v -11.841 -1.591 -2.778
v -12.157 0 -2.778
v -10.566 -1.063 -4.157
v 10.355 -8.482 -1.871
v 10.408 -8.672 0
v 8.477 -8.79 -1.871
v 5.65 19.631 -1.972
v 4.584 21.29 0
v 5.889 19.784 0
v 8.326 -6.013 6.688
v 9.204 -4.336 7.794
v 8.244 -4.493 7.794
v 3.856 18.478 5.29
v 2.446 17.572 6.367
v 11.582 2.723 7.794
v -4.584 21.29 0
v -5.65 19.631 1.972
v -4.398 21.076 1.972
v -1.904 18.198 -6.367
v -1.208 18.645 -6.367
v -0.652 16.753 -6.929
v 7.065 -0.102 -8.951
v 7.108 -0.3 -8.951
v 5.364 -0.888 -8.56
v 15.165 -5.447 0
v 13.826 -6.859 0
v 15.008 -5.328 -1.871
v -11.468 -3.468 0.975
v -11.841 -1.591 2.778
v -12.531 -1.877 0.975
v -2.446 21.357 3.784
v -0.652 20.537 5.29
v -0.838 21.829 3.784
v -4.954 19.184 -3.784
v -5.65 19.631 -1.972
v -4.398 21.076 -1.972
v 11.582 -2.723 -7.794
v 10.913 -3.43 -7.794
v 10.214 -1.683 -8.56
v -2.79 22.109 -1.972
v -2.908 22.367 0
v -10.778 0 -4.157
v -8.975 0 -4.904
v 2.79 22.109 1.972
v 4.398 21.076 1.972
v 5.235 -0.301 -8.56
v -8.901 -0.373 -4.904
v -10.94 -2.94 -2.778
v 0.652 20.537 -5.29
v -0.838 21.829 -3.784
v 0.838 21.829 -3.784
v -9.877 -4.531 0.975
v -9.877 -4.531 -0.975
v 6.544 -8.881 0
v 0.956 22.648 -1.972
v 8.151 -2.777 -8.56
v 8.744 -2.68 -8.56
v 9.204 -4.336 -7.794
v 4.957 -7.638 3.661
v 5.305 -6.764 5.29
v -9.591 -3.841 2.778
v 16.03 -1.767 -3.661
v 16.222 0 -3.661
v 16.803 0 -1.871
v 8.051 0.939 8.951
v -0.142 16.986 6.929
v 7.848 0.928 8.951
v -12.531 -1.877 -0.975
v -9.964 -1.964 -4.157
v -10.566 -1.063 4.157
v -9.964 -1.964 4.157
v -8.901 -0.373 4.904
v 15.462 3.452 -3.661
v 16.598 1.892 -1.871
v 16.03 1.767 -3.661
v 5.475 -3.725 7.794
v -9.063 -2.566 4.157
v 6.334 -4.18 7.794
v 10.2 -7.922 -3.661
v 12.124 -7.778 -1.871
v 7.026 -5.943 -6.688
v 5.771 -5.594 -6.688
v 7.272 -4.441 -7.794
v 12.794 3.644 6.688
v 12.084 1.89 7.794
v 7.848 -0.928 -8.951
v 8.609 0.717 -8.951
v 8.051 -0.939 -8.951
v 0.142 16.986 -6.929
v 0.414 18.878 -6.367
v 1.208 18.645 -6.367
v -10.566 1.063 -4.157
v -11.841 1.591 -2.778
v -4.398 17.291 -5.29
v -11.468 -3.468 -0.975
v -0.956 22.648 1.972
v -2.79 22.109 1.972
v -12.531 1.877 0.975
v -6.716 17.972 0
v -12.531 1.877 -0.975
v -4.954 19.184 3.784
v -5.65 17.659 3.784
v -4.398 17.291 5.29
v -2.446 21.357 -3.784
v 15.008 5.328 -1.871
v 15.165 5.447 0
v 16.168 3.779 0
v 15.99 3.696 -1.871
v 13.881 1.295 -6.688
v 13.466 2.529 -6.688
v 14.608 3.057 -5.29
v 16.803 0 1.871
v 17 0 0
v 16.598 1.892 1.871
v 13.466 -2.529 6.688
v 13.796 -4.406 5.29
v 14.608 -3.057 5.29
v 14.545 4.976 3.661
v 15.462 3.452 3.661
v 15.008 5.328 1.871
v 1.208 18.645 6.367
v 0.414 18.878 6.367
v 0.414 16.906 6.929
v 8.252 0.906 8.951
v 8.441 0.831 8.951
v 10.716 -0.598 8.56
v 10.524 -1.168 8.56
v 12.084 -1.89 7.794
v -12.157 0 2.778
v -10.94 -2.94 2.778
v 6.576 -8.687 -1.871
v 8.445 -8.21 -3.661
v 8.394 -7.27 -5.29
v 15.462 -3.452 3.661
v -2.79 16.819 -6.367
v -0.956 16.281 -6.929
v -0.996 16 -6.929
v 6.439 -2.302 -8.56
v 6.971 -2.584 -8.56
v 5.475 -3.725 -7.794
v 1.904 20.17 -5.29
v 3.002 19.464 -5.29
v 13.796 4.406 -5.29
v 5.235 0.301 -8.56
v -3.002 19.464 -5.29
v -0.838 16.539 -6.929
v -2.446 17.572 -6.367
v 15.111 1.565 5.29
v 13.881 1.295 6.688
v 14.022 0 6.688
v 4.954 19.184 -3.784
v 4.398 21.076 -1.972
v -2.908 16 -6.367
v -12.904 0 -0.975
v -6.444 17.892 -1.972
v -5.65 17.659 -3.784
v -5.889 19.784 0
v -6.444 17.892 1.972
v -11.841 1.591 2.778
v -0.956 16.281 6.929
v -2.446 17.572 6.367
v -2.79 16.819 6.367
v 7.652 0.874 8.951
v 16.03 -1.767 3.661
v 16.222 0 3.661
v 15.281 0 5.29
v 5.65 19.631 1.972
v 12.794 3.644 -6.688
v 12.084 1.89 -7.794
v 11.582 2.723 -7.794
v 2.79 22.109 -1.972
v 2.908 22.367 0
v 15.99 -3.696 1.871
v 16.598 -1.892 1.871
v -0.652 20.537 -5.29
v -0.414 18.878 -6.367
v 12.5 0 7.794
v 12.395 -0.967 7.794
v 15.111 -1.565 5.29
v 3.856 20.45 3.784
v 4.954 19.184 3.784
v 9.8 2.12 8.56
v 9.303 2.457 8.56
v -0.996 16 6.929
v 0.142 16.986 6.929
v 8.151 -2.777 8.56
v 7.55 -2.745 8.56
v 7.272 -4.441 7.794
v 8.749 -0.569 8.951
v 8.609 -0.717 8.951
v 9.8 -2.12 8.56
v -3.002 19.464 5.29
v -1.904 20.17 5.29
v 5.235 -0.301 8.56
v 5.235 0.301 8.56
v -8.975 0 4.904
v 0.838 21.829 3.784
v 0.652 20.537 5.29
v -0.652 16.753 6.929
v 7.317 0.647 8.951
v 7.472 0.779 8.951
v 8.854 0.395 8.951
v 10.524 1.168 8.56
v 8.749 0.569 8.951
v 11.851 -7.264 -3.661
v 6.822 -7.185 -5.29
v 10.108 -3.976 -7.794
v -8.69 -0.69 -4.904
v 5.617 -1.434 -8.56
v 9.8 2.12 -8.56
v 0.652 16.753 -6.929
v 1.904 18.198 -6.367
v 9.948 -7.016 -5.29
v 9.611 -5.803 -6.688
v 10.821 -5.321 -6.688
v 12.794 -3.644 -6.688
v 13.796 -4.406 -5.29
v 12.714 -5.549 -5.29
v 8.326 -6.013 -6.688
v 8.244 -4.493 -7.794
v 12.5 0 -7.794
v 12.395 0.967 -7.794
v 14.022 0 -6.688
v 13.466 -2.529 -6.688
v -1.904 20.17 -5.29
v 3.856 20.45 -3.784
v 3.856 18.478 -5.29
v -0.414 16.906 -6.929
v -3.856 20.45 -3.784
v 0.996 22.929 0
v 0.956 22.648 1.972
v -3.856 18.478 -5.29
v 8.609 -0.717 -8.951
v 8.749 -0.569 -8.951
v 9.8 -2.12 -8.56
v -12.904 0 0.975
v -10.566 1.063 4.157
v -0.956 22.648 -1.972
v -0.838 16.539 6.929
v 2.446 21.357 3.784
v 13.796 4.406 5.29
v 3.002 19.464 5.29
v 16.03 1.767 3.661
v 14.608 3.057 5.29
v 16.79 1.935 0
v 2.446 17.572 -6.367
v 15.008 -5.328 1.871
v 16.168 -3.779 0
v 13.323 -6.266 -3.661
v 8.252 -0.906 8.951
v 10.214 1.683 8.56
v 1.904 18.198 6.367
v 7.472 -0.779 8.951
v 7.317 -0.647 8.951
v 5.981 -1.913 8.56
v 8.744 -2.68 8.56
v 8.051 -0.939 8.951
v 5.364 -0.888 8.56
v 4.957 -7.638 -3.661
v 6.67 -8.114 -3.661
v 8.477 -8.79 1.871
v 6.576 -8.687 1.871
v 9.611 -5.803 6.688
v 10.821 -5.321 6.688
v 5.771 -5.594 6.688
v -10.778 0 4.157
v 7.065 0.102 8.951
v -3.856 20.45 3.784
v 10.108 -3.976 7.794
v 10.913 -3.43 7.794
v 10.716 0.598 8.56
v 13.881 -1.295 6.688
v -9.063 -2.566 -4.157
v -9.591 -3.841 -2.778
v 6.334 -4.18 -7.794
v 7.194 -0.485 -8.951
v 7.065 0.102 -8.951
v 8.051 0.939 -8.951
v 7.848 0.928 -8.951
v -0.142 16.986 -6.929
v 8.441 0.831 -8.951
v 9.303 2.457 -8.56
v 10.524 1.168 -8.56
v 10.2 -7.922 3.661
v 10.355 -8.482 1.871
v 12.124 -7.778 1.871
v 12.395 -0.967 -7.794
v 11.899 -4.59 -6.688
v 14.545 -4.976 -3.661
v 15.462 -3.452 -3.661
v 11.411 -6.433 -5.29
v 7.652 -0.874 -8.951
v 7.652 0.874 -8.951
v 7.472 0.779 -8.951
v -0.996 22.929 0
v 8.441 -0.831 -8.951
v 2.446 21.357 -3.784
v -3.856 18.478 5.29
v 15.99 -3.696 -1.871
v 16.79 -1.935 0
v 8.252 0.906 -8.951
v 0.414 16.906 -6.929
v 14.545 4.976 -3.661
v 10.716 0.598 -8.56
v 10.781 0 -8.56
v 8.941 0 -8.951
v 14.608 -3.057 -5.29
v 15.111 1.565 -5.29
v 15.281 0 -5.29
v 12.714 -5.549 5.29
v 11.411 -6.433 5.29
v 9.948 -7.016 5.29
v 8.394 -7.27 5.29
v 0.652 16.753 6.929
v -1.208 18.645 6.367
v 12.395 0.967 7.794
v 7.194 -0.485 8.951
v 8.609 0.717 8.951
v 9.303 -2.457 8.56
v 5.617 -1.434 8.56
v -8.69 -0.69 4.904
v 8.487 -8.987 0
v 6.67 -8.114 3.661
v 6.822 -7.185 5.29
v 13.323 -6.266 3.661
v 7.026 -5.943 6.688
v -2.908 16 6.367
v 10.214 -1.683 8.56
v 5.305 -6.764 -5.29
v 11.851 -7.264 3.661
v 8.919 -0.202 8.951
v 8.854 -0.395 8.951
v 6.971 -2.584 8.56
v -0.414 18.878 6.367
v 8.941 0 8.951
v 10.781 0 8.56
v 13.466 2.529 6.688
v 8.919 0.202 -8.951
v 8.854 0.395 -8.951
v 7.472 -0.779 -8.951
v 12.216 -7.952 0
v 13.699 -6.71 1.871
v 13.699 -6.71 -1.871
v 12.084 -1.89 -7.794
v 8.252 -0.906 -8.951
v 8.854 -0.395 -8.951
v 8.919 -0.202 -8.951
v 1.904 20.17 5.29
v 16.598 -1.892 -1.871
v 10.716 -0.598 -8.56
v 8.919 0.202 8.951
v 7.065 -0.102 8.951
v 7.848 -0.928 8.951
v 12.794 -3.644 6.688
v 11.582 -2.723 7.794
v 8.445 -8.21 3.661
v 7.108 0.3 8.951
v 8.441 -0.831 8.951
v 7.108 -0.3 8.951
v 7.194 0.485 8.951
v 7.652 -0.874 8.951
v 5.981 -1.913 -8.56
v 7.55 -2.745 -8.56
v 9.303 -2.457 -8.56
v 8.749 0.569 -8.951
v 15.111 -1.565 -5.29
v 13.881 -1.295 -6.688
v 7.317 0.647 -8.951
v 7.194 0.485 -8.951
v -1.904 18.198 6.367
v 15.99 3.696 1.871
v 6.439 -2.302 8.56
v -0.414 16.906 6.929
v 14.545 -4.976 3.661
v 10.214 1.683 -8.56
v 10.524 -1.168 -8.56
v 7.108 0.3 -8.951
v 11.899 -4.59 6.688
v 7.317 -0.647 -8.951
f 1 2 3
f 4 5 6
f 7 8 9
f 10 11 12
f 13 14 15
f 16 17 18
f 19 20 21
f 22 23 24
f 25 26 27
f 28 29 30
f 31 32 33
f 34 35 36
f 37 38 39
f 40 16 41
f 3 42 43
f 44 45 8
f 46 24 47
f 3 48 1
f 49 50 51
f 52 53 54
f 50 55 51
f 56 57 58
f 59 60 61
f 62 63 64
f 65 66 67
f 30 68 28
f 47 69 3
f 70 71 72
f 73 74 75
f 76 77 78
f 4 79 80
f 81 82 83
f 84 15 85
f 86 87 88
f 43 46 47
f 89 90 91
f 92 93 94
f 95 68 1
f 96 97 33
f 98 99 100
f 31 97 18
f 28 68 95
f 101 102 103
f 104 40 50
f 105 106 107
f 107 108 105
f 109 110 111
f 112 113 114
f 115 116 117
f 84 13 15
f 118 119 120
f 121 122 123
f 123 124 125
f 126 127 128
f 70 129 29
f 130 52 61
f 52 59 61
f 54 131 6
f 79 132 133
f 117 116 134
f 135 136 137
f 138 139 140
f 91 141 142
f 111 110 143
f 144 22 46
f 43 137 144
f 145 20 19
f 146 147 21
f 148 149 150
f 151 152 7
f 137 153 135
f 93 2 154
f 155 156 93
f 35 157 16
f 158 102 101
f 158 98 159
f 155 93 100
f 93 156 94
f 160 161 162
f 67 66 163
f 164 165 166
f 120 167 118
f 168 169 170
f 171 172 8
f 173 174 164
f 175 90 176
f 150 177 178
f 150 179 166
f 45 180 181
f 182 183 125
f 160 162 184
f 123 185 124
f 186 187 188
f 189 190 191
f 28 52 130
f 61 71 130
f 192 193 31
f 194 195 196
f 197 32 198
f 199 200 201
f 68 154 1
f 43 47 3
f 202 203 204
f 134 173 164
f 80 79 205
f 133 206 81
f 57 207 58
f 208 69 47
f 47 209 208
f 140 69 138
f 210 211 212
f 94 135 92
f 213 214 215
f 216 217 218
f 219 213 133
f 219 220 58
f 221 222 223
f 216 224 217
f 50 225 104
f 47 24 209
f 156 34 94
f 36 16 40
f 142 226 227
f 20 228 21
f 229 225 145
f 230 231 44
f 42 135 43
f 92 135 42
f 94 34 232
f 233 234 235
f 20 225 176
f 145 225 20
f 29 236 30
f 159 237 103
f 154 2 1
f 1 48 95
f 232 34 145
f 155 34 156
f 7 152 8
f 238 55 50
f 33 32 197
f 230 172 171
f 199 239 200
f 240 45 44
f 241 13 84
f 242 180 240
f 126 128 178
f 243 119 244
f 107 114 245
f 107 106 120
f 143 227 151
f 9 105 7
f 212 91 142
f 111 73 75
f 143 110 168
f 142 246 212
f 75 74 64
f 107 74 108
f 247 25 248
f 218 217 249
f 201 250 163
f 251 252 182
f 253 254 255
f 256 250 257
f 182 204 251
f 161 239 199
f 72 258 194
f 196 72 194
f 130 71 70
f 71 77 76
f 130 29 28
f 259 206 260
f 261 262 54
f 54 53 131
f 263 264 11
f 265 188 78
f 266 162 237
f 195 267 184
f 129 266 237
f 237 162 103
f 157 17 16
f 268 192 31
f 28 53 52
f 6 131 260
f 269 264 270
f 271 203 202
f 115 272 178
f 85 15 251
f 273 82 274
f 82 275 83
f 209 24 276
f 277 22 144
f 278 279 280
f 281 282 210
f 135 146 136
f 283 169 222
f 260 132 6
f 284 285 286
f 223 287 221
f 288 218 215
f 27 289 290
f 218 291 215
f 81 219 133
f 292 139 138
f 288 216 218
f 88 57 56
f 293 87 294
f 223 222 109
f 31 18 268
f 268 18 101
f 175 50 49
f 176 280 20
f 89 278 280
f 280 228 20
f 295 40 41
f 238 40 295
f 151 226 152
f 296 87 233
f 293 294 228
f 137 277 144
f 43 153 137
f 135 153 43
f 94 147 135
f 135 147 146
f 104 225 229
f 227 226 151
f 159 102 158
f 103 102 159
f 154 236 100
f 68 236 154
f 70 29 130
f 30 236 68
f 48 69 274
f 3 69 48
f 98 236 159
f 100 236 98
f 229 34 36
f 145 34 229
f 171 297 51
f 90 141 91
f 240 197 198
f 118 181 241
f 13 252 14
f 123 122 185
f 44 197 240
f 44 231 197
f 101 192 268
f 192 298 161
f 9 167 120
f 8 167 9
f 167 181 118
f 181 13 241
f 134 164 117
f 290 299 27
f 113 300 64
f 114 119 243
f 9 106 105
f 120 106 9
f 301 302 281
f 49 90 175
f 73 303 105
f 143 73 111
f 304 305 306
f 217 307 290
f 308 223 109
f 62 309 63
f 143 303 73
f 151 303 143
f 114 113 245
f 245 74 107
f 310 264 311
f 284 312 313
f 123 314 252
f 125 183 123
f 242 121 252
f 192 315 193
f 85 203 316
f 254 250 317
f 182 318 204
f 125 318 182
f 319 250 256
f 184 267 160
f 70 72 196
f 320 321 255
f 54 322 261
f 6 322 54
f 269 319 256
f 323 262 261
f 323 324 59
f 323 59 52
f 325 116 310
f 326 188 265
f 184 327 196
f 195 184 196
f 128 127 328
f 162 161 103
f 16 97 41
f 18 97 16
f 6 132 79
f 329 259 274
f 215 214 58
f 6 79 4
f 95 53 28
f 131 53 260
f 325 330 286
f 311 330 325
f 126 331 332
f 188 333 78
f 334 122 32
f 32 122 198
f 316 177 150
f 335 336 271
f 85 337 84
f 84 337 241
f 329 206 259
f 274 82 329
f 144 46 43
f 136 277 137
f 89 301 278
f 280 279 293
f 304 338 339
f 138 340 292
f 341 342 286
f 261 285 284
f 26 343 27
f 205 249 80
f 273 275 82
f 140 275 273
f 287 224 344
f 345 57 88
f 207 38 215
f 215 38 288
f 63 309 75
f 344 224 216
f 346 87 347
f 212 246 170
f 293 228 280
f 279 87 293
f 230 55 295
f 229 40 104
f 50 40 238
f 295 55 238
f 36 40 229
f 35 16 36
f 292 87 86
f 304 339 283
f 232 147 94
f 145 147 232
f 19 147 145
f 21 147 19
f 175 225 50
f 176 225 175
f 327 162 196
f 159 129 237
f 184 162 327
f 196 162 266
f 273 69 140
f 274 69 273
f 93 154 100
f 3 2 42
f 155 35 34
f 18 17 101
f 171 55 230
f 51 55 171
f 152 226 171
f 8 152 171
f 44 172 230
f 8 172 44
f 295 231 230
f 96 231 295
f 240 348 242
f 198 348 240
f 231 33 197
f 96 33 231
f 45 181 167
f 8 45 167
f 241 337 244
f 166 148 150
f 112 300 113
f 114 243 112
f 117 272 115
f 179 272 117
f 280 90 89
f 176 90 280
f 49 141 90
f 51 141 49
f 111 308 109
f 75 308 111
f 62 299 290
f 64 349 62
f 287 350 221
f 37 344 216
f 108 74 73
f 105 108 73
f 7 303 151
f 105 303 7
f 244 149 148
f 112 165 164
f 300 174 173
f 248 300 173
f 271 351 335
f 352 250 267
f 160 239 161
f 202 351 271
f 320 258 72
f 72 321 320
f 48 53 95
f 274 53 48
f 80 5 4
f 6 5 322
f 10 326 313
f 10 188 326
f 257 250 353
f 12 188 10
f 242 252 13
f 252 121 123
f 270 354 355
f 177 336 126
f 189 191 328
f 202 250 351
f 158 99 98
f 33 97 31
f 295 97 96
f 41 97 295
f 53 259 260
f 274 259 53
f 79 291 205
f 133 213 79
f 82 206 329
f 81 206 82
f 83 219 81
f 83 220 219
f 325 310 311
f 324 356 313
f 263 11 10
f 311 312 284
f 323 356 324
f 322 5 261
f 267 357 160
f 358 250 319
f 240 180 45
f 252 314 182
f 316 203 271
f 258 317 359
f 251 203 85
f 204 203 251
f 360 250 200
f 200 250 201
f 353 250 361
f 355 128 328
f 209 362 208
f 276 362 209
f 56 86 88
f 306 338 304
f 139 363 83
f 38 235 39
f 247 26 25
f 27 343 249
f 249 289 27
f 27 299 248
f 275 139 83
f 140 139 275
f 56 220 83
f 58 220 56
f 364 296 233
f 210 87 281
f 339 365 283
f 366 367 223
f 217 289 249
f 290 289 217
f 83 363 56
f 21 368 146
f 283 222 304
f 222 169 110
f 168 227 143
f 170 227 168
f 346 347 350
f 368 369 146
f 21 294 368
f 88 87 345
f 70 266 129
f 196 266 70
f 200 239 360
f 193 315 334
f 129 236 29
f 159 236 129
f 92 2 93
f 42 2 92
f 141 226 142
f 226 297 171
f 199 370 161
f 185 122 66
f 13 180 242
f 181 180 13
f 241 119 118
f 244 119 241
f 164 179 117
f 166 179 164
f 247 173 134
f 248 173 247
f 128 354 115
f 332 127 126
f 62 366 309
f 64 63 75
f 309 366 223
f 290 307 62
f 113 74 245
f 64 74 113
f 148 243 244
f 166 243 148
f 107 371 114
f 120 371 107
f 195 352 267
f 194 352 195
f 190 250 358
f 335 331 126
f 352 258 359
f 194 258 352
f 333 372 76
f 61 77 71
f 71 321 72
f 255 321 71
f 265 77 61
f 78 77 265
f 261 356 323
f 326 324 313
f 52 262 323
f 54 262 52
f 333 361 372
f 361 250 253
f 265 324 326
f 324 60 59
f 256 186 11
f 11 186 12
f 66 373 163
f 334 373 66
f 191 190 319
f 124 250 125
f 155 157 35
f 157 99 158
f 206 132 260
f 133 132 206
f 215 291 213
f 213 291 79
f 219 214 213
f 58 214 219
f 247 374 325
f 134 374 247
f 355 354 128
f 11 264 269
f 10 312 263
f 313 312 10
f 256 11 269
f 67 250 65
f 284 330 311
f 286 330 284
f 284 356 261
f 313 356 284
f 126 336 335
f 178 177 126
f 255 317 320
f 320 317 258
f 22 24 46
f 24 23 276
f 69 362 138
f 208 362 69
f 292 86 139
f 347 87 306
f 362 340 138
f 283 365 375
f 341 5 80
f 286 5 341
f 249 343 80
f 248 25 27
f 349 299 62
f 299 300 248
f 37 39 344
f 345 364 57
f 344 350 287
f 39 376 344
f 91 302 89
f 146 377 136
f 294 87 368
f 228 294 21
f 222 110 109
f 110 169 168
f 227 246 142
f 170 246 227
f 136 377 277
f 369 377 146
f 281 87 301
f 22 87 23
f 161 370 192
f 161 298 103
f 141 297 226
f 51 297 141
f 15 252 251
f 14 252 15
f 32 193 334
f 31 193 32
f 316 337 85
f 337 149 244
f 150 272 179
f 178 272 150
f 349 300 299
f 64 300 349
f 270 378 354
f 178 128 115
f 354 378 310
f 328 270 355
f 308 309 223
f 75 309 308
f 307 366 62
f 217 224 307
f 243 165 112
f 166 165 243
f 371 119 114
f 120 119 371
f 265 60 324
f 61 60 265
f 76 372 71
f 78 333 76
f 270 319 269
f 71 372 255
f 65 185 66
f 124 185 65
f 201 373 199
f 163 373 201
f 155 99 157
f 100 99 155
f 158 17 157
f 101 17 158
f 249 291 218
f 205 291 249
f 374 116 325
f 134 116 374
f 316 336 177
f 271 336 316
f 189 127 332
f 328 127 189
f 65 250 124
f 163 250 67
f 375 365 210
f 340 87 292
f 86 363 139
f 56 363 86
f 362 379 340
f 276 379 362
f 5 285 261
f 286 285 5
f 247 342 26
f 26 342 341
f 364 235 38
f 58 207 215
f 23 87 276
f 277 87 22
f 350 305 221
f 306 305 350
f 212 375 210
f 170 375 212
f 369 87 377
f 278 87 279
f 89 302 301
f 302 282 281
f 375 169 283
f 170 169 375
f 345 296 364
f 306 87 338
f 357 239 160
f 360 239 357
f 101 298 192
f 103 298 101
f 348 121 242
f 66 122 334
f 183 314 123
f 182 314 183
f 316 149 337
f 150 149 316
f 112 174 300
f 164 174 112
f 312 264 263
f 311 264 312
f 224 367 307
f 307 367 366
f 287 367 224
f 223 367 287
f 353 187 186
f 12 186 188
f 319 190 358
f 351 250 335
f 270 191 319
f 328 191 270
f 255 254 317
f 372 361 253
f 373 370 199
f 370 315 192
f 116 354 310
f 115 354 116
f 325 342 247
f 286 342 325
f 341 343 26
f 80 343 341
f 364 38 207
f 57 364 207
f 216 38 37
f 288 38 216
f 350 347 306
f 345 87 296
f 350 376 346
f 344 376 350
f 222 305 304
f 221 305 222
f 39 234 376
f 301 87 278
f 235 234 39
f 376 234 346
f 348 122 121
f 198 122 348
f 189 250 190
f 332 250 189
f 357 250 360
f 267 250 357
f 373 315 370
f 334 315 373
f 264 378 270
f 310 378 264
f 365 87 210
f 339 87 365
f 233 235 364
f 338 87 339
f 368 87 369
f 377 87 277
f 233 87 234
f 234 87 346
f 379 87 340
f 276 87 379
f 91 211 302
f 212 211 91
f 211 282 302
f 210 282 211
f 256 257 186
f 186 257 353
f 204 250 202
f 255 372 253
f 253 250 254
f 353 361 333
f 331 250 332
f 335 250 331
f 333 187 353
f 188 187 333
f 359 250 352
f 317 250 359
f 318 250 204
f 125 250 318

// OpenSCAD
hull() {
  translate([-8, 0, 0]) sphere(r = 5);
  translate([8, 0, 0]) sphere(r = 9);
  translate([0, 16, 0]) sphere(r = 7);
}
